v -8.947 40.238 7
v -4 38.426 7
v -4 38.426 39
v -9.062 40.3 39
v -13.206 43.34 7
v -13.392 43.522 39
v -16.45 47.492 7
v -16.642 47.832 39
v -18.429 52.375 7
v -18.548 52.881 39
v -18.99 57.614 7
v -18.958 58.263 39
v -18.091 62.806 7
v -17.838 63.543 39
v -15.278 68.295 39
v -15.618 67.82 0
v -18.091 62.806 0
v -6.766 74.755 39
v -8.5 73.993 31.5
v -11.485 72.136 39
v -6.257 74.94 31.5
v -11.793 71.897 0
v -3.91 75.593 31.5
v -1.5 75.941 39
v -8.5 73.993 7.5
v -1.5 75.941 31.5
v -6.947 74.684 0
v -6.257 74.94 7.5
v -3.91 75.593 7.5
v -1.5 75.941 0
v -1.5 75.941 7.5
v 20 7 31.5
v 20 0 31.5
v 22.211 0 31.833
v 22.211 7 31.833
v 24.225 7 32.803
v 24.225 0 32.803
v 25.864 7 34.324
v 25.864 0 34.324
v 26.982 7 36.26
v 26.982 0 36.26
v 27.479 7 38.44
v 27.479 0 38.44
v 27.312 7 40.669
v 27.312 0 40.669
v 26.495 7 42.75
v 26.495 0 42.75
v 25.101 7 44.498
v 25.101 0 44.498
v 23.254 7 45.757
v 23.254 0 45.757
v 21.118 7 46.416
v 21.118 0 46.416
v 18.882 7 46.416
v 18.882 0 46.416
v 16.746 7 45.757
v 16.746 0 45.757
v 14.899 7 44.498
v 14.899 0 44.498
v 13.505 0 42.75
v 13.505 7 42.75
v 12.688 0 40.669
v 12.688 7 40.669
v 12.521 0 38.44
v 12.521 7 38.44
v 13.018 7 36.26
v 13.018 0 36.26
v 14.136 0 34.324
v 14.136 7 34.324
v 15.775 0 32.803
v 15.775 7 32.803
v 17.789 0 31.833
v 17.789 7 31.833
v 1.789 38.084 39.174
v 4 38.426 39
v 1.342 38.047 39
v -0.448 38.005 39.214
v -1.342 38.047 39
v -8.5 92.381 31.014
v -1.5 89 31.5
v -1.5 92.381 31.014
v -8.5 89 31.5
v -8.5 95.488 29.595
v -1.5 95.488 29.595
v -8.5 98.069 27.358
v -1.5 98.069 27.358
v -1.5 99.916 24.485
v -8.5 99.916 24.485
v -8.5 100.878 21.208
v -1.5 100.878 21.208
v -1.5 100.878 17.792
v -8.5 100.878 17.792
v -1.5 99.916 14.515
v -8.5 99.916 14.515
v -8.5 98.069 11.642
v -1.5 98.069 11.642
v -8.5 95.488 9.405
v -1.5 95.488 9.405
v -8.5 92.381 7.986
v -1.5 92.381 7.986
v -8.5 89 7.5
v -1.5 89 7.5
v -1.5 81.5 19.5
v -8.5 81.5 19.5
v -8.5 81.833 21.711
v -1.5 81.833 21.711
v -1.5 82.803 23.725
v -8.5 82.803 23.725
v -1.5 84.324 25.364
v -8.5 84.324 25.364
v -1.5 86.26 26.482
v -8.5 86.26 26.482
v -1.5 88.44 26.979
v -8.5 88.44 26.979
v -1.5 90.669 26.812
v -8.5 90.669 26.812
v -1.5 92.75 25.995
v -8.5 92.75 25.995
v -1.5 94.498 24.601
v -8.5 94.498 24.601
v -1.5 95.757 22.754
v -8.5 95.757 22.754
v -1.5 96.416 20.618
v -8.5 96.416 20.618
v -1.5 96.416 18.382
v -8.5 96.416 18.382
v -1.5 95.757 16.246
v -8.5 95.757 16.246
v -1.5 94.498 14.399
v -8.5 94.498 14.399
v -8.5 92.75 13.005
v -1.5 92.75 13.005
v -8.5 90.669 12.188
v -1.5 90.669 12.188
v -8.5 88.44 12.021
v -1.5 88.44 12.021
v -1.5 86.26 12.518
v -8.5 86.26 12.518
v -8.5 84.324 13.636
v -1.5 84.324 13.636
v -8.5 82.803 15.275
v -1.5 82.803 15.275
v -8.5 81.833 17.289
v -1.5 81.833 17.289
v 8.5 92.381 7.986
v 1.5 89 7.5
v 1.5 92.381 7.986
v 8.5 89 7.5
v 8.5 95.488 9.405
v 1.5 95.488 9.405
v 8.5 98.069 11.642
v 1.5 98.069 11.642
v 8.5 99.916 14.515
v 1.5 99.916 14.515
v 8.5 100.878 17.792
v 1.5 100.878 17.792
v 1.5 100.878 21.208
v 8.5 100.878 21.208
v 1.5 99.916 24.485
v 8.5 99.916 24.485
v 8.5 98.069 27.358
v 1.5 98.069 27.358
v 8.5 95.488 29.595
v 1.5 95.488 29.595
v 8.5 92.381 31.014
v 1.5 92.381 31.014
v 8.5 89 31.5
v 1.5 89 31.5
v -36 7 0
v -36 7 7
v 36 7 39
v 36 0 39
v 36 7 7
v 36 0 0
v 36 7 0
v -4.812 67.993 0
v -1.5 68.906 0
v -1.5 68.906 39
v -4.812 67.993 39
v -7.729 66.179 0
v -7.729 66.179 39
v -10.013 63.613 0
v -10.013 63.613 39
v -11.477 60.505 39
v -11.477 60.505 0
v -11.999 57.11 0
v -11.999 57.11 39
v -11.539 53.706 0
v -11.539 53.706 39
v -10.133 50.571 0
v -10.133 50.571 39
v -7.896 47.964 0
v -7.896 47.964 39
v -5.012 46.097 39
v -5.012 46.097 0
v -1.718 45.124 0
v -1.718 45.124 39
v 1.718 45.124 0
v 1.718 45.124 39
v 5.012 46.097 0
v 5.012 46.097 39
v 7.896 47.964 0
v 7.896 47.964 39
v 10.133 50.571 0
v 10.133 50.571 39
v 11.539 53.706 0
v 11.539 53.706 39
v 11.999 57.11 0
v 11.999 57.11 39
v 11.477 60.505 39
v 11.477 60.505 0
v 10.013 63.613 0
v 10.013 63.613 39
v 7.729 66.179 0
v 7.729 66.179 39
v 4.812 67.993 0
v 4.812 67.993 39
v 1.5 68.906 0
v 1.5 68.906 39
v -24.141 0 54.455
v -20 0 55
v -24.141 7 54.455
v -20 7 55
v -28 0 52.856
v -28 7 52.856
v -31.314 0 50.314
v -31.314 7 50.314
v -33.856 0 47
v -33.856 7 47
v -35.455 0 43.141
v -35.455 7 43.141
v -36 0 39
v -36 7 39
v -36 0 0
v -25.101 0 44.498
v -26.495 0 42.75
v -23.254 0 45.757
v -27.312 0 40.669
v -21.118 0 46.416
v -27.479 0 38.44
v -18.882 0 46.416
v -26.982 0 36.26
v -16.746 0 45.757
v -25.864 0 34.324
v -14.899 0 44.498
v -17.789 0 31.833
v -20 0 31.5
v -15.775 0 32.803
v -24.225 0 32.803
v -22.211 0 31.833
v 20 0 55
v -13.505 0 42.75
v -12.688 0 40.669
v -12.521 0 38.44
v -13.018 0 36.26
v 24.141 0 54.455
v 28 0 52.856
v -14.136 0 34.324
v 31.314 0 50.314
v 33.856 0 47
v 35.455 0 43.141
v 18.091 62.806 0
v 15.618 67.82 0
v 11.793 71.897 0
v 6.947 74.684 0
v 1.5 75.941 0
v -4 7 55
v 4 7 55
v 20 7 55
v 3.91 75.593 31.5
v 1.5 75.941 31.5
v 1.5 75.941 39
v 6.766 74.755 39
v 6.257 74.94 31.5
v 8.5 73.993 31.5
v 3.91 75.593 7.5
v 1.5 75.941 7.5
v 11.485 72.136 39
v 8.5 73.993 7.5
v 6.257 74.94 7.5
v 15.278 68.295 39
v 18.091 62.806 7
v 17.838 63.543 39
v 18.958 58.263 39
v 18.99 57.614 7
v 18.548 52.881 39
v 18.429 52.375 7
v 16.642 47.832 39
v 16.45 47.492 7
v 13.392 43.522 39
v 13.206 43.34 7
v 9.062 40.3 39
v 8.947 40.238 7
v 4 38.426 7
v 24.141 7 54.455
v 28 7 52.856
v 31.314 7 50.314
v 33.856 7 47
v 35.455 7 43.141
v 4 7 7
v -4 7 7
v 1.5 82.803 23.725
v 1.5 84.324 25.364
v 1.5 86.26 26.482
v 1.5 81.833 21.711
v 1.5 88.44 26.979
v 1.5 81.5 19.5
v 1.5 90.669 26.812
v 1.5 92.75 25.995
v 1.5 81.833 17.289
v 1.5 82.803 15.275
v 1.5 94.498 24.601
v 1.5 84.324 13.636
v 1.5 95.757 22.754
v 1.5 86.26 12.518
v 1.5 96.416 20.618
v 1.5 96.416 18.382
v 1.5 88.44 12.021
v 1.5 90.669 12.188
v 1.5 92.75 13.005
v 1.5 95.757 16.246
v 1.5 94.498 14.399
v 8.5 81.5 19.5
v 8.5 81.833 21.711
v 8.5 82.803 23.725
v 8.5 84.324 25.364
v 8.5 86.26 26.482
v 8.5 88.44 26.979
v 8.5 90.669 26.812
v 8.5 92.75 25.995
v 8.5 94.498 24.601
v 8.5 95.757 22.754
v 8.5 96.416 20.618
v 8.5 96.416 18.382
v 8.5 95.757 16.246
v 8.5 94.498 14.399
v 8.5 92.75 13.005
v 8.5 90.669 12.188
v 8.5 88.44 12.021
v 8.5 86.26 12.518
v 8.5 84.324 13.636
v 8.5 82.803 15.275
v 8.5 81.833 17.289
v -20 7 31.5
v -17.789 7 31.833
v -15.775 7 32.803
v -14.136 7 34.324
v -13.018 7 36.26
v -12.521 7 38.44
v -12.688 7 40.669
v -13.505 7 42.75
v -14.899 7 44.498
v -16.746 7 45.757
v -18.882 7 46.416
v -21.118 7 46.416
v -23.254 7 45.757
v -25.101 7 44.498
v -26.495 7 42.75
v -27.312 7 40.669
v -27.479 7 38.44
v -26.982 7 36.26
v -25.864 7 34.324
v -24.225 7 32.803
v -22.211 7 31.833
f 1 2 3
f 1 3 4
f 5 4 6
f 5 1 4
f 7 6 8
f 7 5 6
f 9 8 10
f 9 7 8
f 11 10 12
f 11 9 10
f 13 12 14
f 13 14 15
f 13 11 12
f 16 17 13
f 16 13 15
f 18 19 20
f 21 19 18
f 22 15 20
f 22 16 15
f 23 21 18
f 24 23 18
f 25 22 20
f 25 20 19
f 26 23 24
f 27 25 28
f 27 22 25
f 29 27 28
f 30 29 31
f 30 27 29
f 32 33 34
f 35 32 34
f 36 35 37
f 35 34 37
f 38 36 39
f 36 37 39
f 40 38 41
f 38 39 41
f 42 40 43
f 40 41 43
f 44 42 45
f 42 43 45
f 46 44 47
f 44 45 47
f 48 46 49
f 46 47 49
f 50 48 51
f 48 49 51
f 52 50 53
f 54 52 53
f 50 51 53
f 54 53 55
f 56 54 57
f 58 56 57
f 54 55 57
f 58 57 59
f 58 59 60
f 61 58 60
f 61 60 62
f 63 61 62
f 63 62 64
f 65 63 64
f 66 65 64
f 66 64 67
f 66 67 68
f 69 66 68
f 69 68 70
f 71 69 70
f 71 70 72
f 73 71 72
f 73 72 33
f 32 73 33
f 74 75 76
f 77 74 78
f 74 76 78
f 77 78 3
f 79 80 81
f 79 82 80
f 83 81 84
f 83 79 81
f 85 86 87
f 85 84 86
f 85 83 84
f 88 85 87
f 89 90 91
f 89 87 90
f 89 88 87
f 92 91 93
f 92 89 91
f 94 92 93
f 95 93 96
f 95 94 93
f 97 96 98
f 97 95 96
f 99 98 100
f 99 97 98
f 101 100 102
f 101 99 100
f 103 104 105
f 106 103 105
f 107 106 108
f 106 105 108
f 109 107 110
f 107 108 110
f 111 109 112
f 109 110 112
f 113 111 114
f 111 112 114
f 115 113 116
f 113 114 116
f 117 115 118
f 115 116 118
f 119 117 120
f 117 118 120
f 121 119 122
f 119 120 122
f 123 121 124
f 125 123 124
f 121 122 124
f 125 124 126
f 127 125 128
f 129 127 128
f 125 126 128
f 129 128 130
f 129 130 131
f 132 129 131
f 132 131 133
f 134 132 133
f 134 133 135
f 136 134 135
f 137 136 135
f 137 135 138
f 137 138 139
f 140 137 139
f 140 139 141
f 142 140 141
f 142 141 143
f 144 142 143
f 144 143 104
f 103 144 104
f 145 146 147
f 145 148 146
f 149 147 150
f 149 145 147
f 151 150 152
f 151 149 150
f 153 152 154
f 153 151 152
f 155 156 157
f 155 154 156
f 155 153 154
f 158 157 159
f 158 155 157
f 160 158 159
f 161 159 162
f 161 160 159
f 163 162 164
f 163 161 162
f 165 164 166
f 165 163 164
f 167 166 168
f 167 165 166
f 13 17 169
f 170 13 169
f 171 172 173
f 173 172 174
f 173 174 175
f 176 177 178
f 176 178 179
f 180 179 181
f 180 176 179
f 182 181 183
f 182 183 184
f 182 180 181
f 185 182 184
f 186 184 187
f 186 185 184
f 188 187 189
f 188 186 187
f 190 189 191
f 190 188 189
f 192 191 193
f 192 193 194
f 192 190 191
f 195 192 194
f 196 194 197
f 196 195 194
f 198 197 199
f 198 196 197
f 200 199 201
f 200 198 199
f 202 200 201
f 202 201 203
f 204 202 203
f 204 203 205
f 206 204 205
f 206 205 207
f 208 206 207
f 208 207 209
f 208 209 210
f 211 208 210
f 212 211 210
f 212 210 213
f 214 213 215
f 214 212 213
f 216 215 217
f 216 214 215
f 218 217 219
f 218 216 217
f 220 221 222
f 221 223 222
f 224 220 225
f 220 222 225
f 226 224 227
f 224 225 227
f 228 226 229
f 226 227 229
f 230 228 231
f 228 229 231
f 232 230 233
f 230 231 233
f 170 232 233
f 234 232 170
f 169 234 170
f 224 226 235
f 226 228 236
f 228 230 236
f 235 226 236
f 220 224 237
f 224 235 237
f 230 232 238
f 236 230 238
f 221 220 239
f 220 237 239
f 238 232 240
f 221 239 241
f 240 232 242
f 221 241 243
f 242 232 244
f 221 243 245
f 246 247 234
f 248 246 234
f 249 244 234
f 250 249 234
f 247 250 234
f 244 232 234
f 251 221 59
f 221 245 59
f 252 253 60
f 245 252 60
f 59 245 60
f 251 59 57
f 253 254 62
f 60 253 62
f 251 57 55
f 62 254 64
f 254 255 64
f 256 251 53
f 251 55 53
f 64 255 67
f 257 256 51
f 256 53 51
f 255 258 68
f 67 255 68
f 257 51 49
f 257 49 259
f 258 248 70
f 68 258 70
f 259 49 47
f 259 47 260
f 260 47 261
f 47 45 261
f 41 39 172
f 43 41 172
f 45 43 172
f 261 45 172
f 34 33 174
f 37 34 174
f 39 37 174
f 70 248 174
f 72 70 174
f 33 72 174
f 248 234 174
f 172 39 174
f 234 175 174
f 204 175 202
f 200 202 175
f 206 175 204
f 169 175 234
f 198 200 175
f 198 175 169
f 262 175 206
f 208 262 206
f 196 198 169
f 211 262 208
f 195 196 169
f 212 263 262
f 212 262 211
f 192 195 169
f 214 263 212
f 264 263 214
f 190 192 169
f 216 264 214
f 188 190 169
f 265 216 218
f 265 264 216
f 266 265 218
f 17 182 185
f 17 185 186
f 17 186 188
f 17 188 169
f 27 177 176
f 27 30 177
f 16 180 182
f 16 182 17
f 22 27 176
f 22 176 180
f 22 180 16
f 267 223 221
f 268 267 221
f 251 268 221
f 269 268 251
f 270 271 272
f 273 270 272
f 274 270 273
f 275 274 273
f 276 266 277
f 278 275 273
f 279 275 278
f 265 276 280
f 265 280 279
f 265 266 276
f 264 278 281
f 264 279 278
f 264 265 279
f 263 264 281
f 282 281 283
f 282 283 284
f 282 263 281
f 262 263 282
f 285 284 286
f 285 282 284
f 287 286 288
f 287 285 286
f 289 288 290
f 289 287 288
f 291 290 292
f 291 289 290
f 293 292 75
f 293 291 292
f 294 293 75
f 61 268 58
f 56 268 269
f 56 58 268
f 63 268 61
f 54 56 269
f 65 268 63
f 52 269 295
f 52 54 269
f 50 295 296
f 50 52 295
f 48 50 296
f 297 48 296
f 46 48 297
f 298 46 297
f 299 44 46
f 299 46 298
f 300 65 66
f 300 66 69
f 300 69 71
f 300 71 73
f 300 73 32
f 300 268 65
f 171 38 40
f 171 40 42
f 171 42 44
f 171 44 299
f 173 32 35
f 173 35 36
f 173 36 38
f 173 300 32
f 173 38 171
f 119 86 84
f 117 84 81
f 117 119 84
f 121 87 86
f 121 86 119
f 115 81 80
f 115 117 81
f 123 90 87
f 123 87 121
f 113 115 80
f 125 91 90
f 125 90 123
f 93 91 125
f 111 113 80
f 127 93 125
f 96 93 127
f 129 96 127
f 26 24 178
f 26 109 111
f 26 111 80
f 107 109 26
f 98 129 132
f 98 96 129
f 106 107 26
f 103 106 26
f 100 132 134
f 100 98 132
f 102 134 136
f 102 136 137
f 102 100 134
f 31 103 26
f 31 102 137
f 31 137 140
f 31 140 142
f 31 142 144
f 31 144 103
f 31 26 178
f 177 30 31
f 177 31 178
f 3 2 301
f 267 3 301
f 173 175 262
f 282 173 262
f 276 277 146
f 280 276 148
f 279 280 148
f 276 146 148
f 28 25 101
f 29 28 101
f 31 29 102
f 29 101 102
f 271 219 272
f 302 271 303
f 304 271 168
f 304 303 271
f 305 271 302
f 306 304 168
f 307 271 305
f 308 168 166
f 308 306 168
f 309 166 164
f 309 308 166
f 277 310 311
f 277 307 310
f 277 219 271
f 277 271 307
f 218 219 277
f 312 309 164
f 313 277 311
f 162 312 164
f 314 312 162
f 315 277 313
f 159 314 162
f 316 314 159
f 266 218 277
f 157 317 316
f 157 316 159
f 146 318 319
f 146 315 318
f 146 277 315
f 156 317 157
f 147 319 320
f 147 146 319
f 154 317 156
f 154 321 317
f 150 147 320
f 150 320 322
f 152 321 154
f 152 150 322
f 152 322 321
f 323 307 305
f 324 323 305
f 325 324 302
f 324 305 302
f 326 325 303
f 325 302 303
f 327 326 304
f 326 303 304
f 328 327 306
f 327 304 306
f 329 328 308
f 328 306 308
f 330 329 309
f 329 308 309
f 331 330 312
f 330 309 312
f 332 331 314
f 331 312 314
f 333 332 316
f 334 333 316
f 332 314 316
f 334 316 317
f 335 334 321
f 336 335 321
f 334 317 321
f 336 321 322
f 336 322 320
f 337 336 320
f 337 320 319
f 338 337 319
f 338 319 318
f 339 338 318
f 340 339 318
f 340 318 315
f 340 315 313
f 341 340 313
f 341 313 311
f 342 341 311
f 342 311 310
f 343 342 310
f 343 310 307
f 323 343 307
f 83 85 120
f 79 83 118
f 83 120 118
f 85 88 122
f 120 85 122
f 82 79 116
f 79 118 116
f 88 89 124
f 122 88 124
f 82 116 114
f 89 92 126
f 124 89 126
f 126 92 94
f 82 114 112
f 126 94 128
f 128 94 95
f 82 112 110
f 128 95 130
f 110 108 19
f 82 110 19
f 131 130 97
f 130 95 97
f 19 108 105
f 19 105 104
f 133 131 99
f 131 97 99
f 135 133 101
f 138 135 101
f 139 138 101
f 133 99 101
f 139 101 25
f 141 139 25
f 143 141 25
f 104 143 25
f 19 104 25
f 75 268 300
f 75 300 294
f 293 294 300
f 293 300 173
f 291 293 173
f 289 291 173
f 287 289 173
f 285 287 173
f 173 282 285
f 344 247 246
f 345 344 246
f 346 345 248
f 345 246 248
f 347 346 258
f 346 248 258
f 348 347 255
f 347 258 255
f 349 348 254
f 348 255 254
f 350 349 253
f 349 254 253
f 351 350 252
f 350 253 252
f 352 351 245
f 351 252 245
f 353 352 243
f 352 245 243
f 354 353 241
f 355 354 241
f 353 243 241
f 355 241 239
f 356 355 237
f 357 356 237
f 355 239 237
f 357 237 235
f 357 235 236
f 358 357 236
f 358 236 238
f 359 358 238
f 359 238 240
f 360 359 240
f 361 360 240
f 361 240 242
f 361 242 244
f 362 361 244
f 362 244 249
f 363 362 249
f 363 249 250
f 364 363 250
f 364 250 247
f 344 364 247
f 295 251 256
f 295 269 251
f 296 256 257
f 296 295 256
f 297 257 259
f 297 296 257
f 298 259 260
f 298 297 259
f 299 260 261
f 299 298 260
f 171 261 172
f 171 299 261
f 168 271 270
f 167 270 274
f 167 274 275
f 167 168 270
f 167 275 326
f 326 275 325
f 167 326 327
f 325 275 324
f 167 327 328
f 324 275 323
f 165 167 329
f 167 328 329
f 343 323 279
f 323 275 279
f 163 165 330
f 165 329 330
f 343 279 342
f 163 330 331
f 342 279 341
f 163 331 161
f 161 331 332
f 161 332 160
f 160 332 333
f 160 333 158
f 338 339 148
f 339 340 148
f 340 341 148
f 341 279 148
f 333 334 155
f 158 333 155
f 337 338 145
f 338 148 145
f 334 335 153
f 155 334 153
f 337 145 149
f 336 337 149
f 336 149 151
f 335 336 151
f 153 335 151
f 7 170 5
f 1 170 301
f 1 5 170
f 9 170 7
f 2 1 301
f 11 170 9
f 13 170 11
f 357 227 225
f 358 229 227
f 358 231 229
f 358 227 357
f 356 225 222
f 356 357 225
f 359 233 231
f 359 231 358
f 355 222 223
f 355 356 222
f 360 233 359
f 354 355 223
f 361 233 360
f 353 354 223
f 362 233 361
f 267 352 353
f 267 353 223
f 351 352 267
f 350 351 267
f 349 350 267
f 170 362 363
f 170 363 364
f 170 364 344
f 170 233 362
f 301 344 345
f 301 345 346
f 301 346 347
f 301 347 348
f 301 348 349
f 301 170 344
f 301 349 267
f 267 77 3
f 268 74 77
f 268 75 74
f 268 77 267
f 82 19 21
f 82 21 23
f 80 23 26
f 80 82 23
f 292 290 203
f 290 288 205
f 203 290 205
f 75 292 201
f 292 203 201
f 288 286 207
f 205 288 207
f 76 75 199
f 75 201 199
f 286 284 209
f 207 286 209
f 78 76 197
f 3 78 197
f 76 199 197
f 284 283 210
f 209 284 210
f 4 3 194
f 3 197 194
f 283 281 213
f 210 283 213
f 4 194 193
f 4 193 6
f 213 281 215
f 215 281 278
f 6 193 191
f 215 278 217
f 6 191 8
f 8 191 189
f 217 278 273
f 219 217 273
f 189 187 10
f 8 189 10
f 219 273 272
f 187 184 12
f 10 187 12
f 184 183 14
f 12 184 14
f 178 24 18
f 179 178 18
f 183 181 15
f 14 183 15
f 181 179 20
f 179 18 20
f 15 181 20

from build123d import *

# Parameters (mm, degrees)
SKETCH1_W                  = 72
SKETCH1_H                  = 7
BOSS_EXTRUDE1_DEPTH        = 55
BOSS_EXTRUDE2_DEPTH        = 7
BOSS_EXTRUDE3_DEPTH        = 39
BOSS_EXTRUDE4_START        = 7.5
BOSS_EXTRUDE4_DEPTH        = 24
BOSS_EXTRUDE5_DEPTH        = 55
FILLET3_RADIUS             = 12
FILLET3_LENGTH             = 7
FILLET4_RADIUS             = 12
FILLET4_LENGTH             = 7
CUT_EXTRUDE1_DEPTH         = 55
F_12_0MM_DOWEL_HOLE1_D     = 15
F_12_0MM_DOWEL_HOLE1_DEPTH = 30
F_12_0MM_DOWEL_HOLE1_TIP   = 4.506454643
FILLET5_R                  = 16
F_12_0MM_DOWEL_HOLE2_D     = 15
F_12_0MM_DOWEL_HOLE2_DEPTH = 30
F_12_0MM_DOWEL_HOLE2_TIP   = 4.506454643


with BuildPart() as part:
    # Sketch1 → Boss-Extrude1 (new body)
    with BuildSketch(Plane.XY):
        with Locations((0, 3.5)):
            Rectangle(SKETCH1_W, SKETCH1_H)
    extrude(amount=BOSS_EXTRUDE1_DEPTH)

    # Sketch1<3> → Boss-Extrude2 (add)
    with BuildSketch(Plane.XY):
        with BuildLine():
            Line((36, 7), (18.091261695, 62.805708421))
            ThreePointArc((18.091261695, 62.805708421), (16.449943687, 47.492142581), (4, 38.425824379))
            Line((4, 38.425824379), (4, 7))
            Line((4, 7), (36, 7))
        make_face()
        with BuildLine():
            ThreePointArc((-4, 38.425824379), (-16.449943687, 47.492142581), (-18.091261695, 62.805708421))
            Line((-18.091261695, 62.805708421), (-36, 7))
            Line((-36, 7), (-4, 7))
            Line((-4, 7), (-4, 38.425824379))
        make_face()
    extrude(amount=BOSS_EXTRUDE2_DEPTH)

    # Sketch1<4> → Boss-Extrude3 (add)
    with BuildSketch(Plane.XY):
        with BuildLine():
            ThreePointArc((-1.5, 68.9058809), (0, 45), (1.5, 68.9058809))
            Line((1.5, 68.9058809), (1.5, 75.940696925))
            ThreePointArc((1.5, 75.940696925), (0, 38), (-1.5, 75.940696925))
            Line((-1.5, 75.940696925), (-1.5, 68.9058809))
        make_face()
    extrude(amount=BOSS_EXTRUDE3_DEPTH)

    # Sketch1<5> → Boss-Extrude4 (add)
    with BuildSketch(Plane.XY.offset(BOSS_EXTRUDE4_START)):
        with BuildLine():
            Line((1.5, 101), (1.5, 75.940696925))
            ThreePointArc((1.5, 75.940696925), (5.093989215, 75.30440586), (8.5, 73.992645468))
            Line((8.5, 73.992645468), (8.5, 101))
            Line((8.5, 101), (1.5, 101))
        make_face()
        with BuildLine():
            ThreePointArc((-8.5, 73.992645468), (-5.093989215, 75.30440586), (-1.5, 75.940696925))
            Line((-1.5, 75.940696925), (-1.5, 101))
            Line((-1.5, 101), (-8.5, 101))
            Line((-8.5, 101), (-8.5, 73.992645468))
        make_face()
    extrude(amount=BOSS_EXTRUDE4_DEPTH)

    # Sketch1<6> → Boss-Extrude5 (add)
    with BuildSketch(Plane.XY):
        with BuildLine():
            ThreePointArc((4, 38.425824379), (0, 38), (-4, 38.425824379))
            Line((-4, 38.425824379), (-4, 7))
            Line((-4, 7), (4, 7))
            Line((4, 7), (4, 38.425824379))
        make_face()
    extrude(amount=BOSS_EXTRUDE5_DEPTH)

    # Fillet3: full round fillet: the end face becomes a half cylinder, R = half its width
    fillet3_face = Plane((5, 101, 19.5), x_dir=(1, 0, 0), z_dir=(0, 1, 0))  # on the end face: x along it, z out of the body
    fillet3_slab = fillet3_face.offset(-FILLET3_RADIUS / 2) * Box(FILLET3_LENGTH, 2 * FILLET3_RADIUS, FILLET3_RADIUS, mode=Mode.PRIVATE)  # the body's end, R deep
    fillet3_round = Plane((5, 89, 19.5), x_dir=(0, 1, 0), z_dir=(1, 0, 0)) * Cylinder(FILLET3_RADIUS, FILLET3_LENGTH, mode=Mode.PRIVATE)  # its axis R under the face
    add(fillet3_slab - fillet3_round, mode=Mode.SUBTRACT)

    # Fillet4: full round fillet: the end face becomes a half cylinder, R = half its width
    fillet4_face = Plane((-5, 101, 19.5), x_dir=(-1, 0, 0), z_dir=(0, 1, 0))  # on the end face: x along it, z out of the body
    fillet4_slab = fillet4_face.offset(-FILLET4_RADIUS / 2) * Box(FILLET4_LENGTH, 2 * FILLET4_RADIUS, FILLET4_RADIUS, mode=Mode.PRIVATE)  # the body's end, R deep
    fillet4_round = Plane((-5, 89, 19.5), x_dir=(0, 1, 0), z_dir=(-1, 0, 0)) * Cylinder(FILLET4_RADIUS, FILLET4_LENGTH, mode=Mode.PRIVATE)  # its axis R under the face
    add(fillet4_slab - fillet4_round, mode=Mode.SUBTRACT)

    # Sketch2 → Cut-Extrude1 (cut)
    with BuildSketch(Plane(origin=(4, 0, 0), x_dir=(0, 0, -1), z_dir=(1, 0, 0))):
        Polygon((-39, 38.425824379), (-55, 7), (-55, 38.425824379), align=None)
    extrude(amount=-CUT_EXTRUDE1_DEPTH, mode=Mode.SUBTRACT)

    # Ø12.0mm Dowel Hole1
    with Locations(Plane(origin=(8.5, 89, 19.5), x_dir=(0, 1, 0), z_dir=(1, 0, 0))):
        with Locations((0, 0)):
            Hole(F_12_0MM_DOWEL_HOLE1_D / 2, depth=F_12_0MM_DOWEL_HOLE1_DEPTH)
            with Locations((0, 0, -(F_12_0MM_DOWEL_HOLE1_DEPTH + F_12_0MM_DOWEL_HOLE1_TIP / 2))):  # 118° drill point
                Cone(0, F_12_0MM_DOWEL_HOLE1_D / 2, F_12_0MM_DOWEL_HOLE1_TIP, mode=Mode.SUBTRACT)

    # Fillet5
    fillet5_edges = [part.edges().sort_by_distance(p)[0] for p in [
        (-36, 3.5, 55),
        (36, 3.5, 55),
    ]]
    fillet(fillet5_edges, radius=FILLET5_R)

    # Ø12.0mm Dowel Hole2
    with Locations(Plane(origin=(20, 7, 39), x_dir=(0, 0, 1), z_dir=(0, 1, 0))):
        with Locations((0, 0), (0, -40)):
            Hole(F_12_0MM_DOWEL_HOLE2_D / 2, depth=F_12_0MM_DOWEL_HOLE2_DEPTH)
            with Locations((0, 0, -(F_12_0MM_DOWEL_HOLE2_DEPTH + F_12_0MM_DOWEL_HOLE2_TIP / 2))):  # 118° drill point
                Cone(0, F_12_0MM_DOWEL_HOLE2_D / 2, F_12_0MM_DOWEL_HOLE2_TIP, mode=Mode.SUBTRACT)


solid = part.part
